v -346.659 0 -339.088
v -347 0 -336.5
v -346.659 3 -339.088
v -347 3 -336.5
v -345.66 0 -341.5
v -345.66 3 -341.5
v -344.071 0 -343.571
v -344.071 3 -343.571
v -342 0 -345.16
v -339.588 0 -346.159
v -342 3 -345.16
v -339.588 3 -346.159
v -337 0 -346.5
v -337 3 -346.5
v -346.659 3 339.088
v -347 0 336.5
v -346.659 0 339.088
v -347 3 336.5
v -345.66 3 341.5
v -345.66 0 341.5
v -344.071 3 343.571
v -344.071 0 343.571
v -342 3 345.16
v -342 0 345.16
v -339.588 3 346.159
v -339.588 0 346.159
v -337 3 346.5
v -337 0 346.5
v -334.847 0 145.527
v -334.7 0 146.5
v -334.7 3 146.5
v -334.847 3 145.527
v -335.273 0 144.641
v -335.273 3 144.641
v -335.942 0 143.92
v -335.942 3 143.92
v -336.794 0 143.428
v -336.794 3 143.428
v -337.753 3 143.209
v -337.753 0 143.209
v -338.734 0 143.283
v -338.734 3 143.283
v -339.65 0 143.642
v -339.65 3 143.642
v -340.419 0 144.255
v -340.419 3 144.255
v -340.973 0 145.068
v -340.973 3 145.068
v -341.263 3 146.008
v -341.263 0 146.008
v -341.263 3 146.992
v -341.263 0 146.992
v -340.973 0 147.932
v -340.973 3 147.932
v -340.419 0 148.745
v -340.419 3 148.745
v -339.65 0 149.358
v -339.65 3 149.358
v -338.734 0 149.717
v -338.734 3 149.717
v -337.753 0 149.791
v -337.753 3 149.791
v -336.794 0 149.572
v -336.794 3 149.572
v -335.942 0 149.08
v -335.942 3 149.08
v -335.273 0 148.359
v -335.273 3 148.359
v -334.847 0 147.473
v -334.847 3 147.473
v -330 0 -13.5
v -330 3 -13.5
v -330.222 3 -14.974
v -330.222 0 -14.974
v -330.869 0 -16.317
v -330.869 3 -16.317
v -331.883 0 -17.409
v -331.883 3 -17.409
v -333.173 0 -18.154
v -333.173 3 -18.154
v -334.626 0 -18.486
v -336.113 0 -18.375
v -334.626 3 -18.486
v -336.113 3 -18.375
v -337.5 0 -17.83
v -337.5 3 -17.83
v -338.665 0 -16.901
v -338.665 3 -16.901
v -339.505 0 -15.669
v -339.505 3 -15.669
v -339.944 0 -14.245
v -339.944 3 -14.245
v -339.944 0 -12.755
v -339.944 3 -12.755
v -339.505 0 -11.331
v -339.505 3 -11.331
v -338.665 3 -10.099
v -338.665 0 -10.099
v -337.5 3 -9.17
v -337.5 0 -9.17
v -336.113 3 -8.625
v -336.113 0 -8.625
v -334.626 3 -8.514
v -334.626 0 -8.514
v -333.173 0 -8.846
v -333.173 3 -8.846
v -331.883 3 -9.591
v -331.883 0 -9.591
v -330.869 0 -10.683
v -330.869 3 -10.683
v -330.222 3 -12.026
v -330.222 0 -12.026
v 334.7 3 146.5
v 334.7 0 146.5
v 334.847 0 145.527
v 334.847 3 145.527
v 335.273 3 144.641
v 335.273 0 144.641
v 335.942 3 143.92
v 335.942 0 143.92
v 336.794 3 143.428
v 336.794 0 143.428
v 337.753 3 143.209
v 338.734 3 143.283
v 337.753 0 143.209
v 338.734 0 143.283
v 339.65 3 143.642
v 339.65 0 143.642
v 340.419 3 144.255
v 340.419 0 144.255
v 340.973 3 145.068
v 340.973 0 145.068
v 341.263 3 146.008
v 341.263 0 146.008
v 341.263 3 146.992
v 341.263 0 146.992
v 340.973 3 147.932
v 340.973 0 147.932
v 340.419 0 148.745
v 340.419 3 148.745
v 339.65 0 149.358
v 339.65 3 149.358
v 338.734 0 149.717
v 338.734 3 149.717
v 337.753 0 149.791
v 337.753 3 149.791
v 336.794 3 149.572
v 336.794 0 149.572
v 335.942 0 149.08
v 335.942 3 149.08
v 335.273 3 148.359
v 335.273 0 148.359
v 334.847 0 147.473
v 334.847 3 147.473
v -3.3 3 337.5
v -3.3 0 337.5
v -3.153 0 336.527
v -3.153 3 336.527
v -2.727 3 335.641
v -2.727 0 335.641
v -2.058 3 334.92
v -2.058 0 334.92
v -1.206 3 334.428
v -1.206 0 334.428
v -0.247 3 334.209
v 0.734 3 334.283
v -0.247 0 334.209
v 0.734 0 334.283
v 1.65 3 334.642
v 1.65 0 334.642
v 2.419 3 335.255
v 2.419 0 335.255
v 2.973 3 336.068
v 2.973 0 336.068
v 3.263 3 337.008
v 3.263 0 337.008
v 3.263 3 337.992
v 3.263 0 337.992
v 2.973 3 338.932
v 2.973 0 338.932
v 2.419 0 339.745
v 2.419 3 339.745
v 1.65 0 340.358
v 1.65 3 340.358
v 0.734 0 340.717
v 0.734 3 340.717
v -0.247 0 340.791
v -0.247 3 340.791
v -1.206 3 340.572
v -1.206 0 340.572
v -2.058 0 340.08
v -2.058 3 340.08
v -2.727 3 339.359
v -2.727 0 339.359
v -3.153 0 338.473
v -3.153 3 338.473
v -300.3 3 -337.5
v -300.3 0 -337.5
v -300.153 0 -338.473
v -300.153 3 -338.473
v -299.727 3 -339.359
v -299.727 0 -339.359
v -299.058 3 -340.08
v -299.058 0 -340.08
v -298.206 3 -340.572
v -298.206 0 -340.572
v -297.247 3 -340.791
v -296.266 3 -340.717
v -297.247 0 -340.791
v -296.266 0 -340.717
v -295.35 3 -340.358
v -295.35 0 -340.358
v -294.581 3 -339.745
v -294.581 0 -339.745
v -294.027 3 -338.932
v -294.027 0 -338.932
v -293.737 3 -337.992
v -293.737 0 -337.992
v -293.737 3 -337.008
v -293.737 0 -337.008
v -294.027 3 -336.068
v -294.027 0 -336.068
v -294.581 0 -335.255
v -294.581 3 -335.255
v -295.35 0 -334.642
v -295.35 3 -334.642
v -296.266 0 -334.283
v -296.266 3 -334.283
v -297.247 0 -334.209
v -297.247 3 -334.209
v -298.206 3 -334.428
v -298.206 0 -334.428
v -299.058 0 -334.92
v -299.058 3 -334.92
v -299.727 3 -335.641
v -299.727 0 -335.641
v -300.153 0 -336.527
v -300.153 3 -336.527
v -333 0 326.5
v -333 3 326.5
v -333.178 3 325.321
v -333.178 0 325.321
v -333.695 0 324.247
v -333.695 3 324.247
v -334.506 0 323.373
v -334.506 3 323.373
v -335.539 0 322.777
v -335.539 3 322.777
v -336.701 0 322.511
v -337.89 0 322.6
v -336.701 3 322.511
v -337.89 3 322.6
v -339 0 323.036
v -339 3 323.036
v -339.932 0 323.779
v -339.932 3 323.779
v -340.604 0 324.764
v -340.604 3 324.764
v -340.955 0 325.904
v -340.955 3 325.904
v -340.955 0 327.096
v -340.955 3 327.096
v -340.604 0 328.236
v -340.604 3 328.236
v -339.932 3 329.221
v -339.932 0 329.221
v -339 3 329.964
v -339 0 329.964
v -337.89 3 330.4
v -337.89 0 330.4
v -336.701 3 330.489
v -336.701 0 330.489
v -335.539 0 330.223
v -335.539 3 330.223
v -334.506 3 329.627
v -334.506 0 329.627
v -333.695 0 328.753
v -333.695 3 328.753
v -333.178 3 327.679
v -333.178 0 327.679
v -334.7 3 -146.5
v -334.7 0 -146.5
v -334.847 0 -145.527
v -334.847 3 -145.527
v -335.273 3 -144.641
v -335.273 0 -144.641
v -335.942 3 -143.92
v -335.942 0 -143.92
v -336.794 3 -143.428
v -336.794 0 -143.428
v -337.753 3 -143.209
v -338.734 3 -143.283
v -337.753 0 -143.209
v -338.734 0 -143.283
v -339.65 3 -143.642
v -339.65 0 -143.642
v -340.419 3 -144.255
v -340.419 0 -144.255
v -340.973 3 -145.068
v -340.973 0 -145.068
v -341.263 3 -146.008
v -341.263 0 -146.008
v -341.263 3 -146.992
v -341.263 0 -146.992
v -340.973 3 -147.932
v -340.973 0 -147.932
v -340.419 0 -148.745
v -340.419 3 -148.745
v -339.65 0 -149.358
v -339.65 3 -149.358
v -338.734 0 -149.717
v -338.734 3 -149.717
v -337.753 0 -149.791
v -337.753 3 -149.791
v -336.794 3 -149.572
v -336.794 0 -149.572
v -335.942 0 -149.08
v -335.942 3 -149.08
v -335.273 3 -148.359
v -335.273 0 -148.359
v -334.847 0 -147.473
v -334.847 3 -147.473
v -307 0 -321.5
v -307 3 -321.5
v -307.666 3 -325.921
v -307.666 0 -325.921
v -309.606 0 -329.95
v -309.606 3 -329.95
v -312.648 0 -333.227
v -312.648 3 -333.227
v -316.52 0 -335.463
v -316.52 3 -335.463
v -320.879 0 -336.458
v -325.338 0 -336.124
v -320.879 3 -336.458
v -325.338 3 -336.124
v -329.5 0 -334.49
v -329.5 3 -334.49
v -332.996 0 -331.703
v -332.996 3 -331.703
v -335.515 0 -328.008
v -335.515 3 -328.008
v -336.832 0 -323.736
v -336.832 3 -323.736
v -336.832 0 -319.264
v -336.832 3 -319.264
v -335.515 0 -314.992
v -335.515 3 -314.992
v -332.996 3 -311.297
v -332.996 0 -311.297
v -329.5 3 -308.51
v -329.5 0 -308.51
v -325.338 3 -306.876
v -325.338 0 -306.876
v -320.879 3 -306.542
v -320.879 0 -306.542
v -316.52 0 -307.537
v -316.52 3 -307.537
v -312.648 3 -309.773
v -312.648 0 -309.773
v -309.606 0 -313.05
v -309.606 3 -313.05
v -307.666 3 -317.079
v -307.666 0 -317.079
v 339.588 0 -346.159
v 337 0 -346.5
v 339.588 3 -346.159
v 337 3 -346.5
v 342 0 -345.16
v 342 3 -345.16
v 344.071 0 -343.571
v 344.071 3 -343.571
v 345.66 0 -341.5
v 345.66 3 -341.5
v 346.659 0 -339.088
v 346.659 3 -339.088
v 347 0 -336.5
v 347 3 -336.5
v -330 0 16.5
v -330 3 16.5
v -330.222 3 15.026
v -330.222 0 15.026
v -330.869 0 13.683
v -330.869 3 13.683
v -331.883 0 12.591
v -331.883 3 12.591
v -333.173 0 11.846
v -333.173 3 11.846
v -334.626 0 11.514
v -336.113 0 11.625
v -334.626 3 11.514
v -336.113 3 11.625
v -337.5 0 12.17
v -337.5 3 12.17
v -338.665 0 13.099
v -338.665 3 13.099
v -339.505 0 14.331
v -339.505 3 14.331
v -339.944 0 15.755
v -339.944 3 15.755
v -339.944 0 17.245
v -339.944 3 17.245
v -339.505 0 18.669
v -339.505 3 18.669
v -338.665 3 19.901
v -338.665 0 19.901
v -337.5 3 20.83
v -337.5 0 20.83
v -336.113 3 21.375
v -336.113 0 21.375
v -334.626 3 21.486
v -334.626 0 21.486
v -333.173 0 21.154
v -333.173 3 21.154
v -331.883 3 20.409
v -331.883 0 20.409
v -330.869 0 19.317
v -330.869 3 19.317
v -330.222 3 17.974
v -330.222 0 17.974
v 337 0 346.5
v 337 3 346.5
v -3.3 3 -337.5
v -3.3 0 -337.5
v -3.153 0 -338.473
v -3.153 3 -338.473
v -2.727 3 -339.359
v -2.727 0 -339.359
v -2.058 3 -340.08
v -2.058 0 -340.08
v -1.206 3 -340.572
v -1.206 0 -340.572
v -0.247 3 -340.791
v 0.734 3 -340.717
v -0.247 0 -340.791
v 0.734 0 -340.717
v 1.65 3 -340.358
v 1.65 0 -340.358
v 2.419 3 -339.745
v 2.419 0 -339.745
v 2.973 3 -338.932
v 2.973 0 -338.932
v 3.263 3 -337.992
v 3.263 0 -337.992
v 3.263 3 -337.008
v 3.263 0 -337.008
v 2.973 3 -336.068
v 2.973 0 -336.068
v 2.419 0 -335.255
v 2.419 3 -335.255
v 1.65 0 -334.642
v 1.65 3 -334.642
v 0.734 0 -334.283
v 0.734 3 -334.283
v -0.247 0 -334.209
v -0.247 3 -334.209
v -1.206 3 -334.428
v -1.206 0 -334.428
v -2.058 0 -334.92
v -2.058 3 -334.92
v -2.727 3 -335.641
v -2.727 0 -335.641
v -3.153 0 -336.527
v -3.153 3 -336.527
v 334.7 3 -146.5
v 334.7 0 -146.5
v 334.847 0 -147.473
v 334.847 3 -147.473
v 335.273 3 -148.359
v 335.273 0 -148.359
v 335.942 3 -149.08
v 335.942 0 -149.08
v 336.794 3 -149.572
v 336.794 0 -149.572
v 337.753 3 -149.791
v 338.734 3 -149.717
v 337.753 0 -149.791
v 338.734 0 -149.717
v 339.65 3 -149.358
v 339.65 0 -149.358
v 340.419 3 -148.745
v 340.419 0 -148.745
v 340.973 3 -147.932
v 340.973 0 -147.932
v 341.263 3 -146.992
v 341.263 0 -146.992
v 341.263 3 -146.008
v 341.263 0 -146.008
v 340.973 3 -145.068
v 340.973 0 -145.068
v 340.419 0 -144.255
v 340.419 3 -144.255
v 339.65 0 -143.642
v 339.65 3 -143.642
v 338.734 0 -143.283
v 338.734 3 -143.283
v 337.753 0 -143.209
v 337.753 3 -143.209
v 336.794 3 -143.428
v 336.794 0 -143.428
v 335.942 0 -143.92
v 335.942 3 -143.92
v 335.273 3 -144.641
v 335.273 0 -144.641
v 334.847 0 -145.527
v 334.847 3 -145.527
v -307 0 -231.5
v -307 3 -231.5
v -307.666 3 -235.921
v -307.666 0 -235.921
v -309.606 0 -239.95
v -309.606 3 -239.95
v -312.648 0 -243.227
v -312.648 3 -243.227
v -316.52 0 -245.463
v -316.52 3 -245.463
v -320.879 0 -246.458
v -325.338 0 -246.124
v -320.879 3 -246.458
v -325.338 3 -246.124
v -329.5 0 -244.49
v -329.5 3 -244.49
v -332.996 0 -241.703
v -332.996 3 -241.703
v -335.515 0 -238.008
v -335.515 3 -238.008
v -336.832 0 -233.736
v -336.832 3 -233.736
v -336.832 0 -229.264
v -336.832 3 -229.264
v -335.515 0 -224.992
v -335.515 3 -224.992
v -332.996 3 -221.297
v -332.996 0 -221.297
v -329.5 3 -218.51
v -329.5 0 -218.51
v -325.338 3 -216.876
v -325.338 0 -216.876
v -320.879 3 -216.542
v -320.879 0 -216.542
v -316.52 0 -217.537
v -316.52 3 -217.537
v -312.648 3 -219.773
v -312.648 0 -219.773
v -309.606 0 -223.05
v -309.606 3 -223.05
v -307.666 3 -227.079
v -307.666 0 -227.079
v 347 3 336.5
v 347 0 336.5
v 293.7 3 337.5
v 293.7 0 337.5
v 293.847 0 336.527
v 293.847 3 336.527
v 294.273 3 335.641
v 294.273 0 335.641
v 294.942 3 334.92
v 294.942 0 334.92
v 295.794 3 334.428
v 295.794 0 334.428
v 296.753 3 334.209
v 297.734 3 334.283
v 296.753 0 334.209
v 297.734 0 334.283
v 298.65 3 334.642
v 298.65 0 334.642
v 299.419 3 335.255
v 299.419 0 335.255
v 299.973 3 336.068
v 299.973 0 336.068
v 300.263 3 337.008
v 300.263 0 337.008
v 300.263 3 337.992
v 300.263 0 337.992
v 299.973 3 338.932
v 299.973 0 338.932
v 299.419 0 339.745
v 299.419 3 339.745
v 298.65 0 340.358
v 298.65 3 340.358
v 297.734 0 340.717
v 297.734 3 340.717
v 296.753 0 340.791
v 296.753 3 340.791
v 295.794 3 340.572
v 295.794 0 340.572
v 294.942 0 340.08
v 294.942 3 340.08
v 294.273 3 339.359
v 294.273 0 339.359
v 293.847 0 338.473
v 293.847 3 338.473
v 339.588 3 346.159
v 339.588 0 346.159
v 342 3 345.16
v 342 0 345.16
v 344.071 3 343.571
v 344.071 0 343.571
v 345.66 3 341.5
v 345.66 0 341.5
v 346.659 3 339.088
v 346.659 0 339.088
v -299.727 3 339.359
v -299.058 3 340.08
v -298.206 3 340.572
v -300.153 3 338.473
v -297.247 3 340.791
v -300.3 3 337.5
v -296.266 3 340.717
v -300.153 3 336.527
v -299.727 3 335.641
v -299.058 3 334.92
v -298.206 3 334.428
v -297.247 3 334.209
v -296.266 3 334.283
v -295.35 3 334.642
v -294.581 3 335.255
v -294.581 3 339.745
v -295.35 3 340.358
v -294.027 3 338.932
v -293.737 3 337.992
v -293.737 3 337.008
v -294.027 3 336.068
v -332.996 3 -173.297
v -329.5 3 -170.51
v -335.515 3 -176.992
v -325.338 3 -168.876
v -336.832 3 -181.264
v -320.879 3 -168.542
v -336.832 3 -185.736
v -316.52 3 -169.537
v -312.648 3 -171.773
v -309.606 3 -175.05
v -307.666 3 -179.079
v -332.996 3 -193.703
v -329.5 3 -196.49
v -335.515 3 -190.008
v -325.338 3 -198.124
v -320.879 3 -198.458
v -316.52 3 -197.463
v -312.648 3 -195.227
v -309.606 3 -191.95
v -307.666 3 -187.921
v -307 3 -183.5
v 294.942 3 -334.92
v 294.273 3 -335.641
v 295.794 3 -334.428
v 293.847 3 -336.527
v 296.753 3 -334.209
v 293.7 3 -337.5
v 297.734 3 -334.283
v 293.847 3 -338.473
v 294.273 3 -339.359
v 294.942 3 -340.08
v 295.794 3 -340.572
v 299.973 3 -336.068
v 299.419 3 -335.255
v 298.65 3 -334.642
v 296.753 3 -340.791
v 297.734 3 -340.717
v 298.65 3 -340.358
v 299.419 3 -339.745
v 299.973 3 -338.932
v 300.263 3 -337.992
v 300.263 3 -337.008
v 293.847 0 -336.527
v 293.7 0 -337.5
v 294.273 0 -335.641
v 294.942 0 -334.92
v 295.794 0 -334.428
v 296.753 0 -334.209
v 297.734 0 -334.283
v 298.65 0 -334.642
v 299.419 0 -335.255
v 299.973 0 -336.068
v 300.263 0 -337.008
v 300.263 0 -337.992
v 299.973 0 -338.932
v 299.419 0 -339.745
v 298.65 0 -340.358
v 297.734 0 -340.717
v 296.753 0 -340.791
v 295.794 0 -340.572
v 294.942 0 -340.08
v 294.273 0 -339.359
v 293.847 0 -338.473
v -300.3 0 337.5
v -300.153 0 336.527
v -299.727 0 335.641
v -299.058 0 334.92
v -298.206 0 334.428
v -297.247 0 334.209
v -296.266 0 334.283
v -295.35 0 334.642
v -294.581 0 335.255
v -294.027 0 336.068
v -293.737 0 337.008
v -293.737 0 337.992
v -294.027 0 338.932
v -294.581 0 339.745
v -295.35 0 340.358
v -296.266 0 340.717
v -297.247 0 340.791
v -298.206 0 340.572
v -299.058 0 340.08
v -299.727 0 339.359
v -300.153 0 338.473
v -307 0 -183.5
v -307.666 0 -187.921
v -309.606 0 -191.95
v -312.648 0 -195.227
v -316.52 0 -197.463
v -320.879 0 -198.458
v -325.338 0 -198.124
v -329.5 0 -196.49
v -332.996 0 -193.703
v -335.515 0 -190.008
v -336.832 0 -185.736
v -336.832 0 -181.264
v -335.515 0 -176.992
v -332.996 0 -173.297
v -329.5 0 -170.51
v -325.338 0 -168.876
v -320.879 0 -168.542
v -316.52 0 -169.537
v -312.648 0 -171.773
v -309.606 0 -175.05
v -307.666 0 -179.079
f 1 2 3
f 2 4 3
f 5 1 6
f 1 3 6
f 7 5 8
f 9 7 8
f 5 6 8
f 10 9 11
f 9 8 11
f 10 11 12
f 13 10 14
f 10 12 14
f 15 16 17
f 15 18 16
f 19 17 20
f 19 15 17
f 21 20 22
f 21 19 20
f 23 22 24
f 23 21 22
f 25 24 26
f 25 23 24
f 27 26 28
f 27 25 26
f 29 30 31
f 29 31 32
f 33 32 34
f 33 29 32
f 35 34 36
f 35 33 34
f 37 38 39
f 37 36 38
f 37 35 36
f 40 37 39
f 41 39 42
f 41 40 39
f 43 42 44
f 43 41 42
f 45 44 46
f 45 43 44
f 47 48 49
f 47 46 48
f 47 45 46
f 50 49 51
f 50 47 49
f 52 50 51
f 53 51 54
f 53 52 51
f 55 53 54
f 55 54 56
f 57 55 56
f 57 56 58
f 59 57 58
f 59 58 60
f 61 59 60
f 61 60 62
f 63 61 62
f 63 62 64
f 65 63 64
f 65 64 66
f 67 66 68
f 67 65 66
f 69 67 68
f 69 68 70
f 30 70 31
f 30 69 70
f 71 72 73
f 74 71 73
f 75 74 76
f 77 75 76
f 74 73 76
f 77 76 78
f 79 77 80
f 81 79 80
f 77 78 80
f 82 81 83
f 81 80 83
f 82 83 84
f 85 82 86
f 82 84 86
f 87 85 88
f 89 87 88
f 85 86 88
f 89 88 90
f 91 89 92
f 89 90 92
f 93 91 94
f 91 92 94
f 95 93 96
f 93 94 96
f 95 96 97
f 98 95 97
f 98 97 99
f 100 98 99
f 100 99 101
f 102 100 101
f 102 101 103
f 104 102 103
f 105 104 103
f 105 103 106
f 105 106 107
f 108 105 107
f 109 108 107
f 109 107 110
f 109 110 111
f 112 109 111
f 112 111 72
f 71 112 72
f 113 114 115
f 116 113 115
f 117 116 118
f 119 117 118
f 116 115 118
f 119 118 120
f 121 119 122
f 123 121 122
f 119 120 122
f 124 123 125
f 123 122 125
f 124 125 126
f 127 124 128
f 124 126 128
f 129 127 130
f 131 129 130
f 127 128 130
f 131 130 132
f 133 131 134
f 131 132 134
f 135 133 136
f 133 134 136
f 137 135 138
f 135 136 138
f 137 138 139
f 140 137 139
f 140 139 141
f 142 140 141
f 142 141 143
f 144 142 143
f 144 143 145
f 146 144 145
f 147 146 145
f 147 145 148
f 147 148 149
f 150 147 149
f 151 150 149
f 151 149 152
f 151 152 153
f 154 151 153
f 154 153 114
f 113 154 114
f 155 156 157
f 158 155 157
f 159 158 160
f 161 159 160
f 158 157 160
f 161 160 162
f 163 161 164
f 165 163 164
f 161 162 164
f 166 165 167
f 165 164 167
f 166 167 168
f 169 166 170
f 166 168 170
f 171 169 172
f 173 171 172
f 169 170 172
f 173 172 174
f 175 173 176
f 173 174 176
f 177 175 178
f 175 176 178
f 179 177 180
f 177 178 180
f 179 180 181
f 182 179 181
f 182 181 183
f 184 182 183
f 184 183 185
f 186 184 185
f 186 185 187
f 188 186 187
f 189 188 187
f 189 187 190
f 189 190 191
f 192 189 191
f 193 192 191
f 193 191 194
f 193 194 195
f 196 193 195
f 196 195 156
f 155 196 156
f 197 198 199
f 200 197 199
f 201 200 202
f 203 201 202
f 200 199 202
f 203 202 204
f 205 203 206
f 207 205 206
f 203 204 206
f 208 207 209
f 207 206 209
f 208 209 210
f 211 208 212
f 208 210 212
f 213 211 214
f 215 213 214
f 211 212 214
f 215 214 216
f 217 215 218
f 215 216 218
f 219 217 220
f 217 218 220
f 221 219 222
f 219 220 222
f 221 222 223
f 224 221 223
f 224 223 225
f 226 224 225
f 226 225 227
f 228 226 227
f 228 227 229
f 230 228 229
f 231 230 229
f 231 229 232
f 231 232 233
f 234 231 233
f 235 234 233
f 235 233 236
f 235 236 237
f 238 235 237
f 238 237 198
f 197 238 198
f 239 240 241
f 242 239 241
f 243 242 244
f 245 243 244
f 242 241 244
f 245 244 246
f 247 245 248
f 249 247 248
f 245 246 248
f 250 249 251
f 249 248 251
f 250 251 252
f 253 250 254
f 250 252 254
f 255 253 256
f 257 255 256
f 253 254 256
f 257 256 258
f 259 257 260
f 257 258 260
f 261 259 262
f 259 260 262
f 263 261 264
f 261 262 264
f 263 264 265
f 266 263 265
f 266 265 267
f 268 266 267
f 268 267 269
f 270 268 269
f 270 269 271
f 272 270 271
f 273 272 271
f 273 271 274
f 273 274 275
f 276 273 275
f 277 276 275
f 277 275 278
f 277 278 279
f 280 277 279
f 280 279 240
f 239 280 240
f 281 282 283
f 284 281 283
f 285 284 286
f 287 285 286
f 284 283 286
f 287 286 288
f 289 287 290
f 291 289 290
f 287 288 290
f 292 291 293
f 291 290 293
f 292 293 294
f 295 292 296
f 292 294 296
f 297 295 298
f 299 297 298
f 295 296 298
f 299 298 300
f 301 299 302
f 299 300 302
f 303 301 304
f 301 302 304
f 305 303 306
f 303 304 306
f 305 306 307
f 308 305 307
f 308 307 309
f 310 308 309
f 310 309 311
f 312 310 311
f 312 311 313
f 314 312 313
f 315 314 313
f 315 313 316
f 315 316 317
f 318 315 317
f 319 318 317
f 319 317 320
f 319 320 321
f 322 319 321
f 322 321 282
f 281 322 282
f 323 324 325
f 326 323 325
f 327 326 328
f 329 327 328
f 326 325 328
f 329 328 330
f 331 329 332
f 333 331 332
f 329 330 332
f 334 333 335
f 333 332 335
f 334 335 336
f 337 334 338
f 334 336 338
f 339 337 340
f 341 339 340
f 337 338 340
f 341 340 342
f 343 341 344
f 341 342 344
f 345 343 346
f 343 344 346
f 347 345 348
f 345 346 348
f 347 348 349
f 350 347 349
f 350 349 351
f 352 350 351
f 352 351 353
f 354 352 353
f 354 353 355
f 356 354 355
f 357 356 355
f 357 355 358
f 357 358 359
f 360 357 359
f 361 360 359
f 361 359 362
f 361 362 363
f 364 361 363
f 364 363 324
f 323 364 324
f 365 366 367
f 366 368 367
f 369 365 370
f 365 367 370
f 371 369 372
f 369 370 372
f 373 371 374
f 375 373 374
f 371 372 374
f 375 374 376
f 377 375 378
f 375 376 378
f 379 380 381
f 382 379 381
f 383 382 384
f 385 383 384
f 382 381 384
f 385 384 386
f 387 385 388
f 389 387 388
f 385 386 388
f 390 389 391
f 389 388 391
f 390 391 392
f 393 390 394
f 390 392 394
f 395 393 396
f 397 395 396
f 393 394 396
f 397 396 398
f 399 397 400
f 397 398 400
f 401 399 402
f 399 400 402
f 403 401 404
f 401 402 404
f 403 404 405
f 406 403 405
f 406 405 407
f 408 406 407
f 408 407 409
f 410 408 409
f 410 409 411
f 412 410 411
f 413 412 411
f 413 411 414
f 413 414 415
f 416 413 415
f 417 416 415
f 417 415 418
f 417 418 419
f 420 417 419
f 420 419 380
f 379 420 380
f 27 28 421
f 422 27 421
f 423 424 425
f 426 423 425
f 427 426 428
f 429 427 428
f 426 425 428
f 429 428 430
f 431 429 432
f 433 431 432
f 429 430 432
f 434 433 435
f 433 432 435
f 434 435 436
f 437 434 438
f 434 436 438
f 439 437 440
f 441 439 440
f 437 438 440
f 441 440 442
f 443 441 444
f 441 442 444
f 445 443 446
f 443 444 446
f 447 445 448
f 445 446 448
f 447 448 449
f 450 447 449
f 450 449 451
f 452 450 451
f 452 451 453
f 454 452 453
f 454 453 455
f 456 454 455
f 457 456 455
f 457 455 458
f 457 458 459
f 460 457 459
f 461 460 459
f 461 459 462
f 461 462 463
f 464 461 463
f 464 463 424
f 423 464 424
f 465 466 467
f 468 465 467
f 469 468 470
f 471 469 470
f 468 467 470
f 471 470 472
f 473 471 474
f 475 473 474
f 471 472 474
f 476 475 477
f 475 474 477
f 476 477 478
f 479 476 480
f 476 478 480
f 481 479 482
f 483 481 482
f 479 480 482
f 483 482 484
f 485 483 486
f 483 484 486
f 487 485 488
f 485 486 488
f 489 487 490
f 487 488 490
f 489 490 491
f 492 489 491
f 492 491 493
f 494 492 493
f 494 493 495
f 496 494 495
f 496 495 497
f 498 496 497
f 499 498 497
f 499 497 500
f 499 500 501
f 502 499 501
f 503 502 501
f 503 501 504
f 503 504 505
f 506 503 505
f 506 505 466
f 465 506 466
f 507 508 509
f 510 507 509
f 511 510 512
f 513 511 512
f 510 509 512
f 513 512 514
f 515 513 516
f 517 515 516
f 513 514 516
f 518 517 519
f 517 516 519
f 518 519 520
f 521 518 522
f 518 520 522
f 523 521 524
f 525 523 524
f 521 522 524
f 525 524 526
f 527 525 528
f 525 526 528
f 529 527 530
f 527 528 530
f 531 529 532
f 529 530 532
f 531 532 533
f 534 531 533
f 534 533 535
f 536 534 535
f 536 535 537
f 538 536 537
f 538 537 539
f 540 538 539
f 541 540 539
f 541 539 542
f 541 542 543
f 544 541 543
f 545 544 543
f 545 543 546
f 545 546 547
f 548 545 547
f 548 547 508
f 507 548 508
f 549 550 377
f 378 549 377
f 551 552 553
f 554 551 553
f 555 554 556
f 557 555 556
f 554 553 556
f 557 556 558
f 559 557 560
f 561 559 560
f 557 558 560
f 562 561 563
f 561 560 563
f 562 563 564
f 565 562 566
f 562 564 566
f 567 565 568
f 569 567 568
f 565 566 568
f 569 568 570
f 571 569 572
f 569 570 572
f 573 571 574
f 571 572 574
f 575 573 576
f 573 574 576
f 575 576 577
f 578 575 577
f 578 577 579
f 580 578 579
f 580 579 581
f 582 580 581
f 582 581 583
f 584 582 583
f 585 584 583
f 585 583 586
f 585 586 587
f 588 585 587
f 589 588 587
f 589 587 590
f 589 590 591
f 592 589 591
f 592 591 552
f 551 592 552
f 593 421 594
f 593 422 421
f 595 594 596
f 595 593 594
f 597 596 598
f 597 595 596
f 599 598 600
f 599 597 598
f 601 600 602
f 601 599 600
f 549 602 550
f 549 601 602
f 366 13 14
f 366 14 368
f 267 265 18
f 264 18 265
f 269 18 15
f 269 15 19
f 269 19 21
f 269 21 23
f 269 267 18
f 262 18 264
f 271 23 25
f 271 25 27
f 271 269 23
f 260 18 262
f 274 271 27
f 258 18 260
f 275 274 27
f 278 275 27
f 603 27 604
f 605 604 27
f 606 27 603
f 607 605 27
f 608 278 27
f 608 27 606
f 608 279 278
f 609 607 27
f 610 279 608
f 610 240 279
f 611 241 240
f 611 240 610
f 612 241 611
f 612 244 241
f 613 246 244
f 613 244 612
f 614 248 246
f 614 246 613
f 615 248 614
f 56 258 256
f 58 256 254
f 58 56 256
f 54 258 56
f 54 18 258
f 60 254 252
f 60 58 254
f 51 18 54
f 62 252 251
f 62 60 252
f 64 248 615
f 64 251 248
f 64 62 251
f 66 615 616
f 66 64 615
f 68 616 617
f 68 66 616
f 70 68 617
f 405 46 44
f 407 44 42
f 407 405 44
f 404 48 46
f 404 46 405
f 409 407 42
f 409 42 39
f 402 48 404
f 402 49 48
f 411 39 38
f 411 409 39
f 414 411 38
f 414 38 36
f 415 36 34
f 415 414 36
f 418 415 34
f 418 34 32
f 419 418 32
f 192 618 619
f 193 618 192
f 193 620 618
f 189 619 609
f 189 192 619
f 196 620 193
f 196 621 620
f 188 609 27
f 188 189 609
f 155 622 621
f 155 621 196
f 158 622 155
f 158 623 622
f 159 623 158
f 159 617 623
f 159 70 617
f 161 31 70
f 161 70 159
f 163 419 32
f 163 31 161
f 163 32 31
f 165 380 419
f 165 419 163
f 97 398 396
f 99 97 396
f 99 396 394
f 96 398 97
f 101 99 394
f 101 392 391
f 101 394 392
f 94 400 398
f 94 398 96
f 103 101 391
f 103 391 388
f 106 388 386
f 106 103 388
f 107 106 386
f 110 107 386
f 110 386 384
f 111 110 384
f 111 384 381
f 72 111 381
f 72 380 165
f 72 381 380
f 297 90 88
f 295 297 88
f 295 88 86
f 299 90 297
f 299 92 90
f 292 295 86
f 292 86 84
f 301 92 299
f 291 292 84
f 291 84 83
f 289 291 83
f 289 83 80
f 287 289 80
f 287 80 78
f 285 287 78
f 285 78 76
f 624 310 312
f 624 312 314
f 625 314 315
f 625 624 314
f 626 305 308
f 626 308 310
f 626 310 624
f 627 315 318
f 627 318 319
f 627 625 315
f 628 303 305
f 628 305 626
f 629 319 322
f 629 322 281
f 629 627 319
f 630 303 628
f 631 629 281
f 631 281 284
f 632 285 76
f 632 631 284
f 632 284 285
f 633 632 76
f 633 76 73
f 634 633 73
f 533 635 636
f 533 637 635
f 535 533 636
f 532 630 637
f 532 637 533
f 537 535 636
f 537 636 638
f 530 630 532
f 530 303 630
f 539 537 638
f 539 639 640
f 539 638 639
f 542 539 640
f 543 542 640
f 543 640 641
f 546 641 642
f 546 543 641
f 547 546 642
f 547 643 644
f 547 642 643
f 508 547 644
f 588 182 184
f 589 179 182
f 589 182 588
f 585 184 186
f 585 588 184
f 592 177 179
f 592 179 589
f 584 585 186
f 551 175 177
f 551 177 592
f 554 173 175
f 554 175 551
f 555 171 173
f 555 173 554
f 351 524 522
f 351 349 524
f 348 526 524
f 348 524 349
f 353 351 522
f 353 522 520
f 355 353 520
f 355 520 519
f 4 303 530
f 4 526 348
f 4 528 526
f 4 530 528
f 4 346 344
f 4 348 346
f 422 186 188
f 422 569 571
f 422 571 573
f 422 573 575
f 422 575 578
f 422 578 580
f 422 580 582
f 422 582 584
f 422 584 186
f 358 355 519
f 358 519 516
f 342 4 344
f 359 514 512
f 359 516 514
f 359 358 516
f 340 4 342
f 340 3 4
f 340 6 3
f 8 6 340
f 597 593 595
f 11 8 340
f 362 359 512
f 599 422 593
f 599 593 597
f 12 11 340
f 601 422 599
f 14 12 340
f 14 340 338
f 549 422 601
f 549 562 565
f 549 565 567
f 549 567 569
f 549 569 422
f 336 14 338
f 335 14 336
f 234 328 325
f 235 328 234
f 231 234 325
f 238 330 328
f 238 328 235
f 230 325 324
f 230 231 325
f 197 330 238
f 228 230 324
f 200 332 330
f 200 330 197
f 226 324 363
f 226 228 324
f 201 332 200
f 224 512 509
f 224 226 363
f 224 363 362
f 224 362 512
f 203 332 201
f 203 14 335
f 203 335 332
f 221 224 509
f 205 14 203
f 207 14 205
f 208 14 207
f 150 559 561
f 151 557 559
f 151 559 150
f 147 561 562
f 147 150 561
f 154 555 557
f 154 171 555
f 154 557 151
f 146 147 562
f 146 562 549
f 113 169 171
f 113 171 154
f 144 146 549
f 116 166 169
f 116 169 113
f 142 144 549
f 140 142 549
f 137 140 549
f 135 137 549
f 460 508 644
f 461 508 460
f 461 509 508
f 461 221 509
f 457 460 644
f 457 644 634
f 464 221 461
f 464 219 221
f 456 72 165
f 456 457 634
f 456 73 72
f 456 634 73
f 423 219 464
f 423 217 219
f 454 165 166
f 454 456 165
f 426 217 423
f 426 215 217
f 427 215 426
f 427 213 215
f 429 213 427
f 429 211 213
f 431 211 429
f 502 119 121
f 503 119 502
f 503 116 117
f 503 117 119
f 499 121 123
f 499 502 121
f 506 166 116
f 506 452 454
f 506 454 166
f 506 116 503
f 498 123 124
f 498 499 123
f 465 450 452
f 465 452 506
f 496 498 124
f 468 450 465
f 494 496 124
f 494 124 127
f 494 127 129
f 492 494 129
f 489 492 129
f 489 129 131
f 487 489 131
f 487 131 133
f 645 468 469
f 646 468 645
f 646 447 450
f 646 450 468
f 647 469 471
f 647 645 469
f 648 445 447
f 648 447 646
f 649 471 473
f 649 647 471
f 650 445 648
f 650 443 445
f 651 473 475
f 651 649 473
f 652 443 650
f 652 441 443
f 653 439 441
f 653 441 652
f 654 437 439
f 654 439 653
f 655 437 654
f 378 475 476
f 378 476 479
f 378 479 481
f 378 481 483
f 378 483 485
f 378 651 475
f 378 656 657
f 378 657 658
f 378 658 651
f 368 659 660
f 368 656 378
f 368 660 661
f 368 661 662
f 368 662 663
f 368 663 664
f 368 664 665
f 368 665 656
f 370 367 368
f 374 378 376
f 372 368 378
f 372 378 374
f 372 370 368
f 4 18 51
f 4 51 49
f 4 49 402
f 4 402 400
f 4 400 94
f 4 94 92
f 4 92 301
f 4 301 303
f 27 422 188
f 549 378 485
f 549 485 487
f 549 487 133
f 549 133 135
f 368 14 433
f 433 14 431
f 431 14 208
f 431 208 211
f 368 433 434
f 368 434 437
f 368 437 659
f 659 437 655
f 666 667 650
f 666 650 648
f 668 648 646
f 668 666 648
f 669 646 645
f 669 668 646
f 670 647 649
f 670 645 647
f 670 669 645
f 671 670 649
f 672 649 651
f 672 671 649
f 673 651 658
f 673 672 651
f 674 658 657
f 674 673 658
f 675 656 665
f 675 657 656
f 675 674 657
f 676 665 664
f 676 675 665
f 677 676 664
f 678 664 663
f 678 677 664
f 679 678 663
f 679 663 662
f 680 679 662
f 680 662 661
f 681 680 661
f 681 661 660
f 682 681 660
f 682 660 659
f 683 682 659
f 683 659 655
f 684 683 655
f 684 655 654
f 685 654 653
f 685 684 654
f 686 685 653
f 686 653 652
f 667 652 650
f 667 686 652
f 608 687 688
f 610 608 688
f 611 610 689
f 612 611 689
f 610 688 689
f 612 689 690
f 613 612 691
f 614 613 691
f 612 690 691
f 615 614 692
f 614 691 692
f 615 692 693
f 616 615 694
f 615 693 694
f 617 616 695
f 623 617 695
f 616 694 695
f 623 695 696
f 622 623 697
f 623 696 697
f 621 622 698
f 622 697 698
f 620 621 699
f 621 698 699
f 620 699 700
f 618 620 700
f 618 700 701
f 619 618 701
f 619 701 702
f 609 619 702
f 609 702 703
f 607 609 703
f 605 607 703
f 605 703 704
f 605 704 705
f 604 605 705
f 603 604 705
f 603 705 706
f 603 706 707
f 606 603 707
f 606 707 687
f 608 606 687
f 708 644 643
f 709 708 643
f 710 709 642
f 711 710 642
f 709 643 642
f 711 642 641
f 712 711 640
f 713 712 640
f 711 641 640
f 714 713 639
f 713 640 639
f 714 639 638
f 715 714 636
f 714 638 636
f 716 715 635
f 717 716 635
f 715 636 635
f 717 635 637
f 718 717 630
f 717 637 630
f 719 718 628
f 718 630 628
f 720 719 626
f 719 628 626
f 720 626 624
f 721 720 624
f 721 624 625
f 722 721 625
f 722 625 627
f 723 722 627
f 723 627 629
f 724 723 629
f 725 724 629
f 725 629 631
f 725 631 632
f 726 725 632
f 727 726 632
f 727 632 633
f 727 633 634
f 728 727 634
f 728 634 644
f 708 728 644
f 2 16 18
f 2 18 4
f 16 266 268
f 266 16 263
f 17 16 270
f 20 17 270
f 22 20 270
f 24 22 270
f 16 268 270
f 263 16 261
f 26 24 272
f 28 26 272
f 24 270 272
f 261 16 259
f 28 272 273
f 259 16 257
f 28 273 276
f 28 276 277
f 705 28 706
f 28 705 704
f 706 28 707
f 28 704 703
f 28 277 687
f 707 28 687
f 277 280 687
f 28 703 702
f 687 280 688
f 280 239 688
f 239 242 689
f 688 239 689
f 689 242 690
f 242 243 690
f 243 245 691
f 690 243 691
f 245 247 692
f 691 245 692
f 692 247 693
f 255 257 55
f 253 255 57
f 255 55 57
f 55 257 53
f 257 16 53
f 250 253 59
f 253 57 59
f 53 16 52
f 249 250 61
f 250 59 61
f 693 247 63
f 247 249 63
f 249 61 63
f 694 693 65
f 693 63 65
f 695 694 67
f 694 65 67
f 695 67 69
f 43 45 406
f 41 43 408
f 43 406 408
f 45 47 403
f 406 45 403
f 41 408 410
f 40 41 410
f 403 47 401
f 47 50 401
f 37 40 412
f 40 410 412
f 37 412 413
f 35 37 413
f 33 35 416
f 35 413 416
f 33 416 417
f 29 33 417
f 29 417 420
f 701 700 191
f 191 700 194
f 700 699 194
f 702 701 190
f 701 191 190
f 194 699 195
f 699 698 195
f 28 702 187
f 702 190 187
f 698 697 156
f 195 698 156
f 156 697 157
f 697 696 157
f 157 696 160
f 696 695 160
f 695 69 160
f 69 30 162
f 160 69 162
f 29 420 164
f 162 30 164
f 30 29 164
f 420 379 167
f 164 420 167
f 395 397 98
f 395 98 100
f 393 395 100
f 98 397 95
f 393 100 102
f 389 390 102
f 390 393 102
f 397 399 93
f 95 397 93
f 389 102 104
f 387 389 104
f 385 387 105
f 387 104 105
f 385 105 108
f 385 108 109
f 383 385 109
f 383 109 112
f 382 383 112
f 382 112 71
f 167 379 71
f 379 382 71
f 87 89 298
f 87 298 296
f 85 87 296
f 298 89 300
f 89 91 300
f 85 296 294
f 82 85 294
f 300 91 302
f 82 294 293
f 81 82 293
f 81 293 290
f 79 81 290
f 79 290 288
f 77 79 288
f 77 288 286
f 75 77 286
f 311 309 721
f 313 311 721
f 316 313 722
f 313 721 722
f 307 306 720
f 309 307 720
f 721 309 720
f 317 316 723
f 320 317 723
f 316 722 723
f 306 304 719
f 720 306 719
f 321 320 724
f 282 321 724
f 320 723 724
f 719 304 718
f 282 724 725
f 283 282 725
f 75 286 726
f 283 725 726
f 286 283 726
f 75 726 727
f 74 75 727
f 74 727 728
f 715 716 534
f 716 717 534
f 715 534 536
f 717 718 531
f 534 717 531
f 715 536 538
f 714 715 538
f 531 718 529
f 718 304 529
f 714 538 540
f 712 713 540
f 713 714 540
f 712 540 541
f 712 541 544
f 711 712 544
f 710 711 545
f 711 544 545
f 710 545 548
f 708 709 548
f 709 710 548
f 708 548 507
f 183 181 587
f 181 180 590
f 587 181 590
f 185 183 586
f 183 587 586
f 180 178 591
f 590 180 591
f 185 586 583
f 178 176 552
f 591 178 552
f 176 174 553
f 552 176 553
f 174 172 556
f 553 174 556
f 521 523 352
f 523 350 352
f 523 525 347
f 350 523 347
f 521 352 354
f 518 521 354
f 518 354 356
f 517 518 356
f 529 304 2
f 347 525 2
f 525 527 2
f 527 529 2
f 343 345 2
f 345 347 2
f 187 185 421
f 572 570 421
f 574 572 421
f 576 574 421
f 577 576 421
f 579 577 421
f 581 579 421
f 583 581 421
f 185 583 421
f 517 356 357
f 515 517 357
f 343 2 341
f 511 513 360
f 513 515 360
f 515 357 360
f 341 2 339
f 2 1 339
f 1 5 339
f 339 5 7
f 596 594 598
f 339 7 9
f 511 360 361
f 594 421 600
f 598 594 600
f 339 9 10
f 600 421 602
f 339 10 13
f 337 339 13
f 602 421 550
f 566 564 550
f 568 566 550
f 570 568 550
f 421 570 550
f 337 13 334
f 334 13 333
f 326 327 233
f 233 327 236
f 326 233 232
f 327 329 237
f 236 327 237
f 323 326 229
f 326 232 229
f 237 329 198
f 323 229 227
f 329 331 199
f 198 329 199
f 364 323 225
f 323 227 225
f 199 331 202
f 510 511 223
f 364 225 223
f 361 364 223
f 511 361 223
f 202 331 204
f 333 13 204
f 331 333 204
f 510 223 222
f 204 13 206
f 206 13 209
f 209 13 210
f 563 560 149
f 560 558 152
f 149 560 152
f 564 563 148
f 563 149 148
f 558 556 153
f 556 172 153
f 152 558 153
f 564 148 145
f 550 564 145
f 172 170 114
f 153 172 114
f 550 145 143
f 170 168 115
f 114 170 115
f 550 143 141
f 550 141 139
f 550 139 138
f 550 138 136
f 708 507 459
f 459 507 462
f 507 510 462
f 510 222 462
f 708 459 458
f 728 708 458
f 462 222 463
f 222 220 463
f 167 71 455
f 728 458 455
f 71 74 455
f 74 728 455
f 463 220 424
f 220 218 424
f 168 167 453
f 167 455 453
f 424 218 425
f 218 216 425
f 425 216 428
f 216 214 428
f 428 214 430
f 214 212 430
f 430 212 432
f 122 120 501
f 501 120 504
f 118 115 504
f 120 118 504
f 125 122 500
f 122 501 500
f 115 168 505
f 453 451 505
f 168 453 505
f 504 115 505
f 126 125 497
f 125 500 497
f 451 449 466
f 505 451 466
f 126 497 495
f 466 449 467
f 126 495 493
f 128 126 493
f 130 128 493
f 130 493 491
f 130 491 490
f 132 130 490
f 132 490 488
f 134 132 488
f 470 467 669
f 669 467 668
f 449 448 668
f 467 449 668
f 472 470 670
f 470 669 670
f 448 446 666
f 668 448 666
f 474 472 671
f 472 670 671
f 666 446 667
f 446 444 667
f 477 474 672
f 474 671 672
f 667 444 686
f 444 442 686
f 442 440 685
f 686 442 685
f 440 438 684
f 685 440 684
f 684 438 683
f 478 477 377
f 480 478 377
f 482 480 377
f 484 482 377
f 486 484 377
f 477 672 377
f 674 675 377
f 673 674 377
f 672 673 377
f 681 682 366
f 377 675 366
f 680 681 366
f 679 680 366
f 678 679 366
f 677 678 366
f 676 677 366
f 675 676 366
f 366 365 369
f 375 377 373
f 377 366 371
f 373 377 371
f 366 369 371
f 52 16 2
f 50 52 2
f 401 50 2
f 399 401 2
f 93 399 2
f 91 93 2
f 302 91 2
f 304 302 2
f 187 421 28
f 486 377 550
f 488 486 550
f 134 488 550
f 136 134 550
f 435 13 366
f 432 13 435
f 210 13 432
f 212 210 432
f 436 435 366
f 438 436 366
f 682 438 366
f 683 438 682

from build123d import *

# Parameters (mm, degrees)
SKETCH1_W            = 694
SKETCH1_H            = 693
BOSS_EXTRUDE1_DEPTH  = 3
M6_CLEARANCE_HOLE1_D = 6.6
LPATTERN1_COUNT      = 3
LPATTERN1_PITCH      = 297
MIRROR1_COPY_1_D     = 6.6
MIRROR1_COPY_2_D     = 6.6
M6_CLEARANCE_HOLE2_D = 6.6
LPATTERN2_COUNT      = 2
LPATTERN2_PITCH      = 293
MIRROR2_COPY_1_D     = 6.6
FILLET1_R            = 10
SKETCH6_R            = 4
SKETCH6_R_2          = 5
SKETCH6_R_3          = 15
CUT_EXTRUDE1_DEPTH   = 4


with BuildPart() as part:
    # Sketch1 → Boss-Extrude1 (new body)
    with BuildSketch(Plane(origin=(0, 0, 0), x_dir=(1, 0, 0), z_dir=(0, 1, 0))):
        Rectangle(SKETCH1_W, SKETCH1_H)
    extrude(amount=BOSS_EXTRUDE1_DEPTH)

    # M6 Clearance Hole1 (through all)
    with Locations(Plane(origin=(0, 3, 0), x_dir=(1, 0, 0), z_dir=(0, 1, 0))):
        with Locations((297, -337.5)):
            m6_clearance_hole1 = Hole(M6_CLEARANCE_HOLE1_D / 2)

    # LPattern1: M6 Clearance Hole1 ×3
    with Locations(*[(-i * LPATTERN1_PITCH, 0, 0) for i in range(1, LPATTERN1_COUNT)]):
        add(m6_clearance_hole1, mode=Mode.SUBTRACT)

    # Mirror1: M6 Clearance Hole1 across plane
    add(m6_clearance_hole1.mirror(Plane.XY), mode=Mode.SUBTRACT)

    # Mirror1 copy 1 (through all)
    with Locations(Plane(origin=(-297, 3, 0), x_dir=(1, 0, 0), z_dir=(0, 1, 0))):
        with Locations((297, 337.5)):
            Hole(MIRROR1_COPY_1_D / 2)

    # Mirror1 copy 2 (through all)
    with Locations(Plane(origin=(-594, 3, 0), x_dir=(1, 0, 0), z_dir=(0, 1, 0))):
        with Locations((297, 337.5)):
            Hole(MIRROR1_COPY_2_D / 2)

    # M6 Clearance Hole2 (through all)
    with Locations(Plane(origin=(0, 3, 0), x_dir=(1, 0, 0), z_dir=(0, 1, 0))):
        with Locations((338, -146.5)):
            m6_clearance_hole2 = Hole(M6_CLEARANCE_HOLE2_D / 2)

    # LPattern2: M6 Clearance Hole2 ×2
    with Locations(*[(0, 0, -i * LPATTERN2_PITCH) for i in range(1, LPATTERN2_COUNT)]):
        add(m6_clearance_hole2, mode=Mode.SUBTRACT)

    # Mirror2: M6 Clearance Hole2 across plane
    add(m6_clearance_hole2.mirror(Plane(origin=(0, 0, 0), x_dir=(0, 0, 1), z_dir=(1, 0, 0))), mode=Mode.SUBTRACT)

    # Mirror2 copy 1 (through all)
    with Locations(Plane(origin=(0, 3, -293), x_dir=(-1, 0, 0), z_dir=(0, 1, 0))):
        with Locations((338, 146.5)):
            Hole(MIRROR2_COPY_1_D / 2)

    # Fillet1
    fillet1_edges = [part.edges().sort_by_distance(p)[0] for p in [
        (-347, 1.5, -346.5),
        (347, 1.5, -346.5),
        (347, 1.5, 346.5),
        (-347, 1.5, 346.5),
    ]]
    fillet(fillet1_edges, radius=FILLET1_R)

    # Sketch6 → Cut-Extrude1 (cut, through all)
    with BuildSketch(Plane(origin=(0, 3, 0), x_dir=(1, 0, 0), z_dir=(0, 1, 0))):
        with Locations((-337, -326.5)):
            Circle(SKETCH6_R)
        with Locations((-335, -16.5)):
            Circle(SKETCH6_R_2)
        with Locations((-335, 13.5)):
            Circle(SKETCH6_R_2)
        with Locations((-322, 183.5)):
            Circle(SKETCH6_R_3)
        with Locations((-322, 231.5)):
            Circle(SKETCH6_R_3)
        with Locations((-322, 321.5)):
            Circle(SKETCH6_R_3)
    extrude(amount=-CUT_EXTRUDE1_DEPTH, mode=Mode.SUBTRACT)


solid = part.part
